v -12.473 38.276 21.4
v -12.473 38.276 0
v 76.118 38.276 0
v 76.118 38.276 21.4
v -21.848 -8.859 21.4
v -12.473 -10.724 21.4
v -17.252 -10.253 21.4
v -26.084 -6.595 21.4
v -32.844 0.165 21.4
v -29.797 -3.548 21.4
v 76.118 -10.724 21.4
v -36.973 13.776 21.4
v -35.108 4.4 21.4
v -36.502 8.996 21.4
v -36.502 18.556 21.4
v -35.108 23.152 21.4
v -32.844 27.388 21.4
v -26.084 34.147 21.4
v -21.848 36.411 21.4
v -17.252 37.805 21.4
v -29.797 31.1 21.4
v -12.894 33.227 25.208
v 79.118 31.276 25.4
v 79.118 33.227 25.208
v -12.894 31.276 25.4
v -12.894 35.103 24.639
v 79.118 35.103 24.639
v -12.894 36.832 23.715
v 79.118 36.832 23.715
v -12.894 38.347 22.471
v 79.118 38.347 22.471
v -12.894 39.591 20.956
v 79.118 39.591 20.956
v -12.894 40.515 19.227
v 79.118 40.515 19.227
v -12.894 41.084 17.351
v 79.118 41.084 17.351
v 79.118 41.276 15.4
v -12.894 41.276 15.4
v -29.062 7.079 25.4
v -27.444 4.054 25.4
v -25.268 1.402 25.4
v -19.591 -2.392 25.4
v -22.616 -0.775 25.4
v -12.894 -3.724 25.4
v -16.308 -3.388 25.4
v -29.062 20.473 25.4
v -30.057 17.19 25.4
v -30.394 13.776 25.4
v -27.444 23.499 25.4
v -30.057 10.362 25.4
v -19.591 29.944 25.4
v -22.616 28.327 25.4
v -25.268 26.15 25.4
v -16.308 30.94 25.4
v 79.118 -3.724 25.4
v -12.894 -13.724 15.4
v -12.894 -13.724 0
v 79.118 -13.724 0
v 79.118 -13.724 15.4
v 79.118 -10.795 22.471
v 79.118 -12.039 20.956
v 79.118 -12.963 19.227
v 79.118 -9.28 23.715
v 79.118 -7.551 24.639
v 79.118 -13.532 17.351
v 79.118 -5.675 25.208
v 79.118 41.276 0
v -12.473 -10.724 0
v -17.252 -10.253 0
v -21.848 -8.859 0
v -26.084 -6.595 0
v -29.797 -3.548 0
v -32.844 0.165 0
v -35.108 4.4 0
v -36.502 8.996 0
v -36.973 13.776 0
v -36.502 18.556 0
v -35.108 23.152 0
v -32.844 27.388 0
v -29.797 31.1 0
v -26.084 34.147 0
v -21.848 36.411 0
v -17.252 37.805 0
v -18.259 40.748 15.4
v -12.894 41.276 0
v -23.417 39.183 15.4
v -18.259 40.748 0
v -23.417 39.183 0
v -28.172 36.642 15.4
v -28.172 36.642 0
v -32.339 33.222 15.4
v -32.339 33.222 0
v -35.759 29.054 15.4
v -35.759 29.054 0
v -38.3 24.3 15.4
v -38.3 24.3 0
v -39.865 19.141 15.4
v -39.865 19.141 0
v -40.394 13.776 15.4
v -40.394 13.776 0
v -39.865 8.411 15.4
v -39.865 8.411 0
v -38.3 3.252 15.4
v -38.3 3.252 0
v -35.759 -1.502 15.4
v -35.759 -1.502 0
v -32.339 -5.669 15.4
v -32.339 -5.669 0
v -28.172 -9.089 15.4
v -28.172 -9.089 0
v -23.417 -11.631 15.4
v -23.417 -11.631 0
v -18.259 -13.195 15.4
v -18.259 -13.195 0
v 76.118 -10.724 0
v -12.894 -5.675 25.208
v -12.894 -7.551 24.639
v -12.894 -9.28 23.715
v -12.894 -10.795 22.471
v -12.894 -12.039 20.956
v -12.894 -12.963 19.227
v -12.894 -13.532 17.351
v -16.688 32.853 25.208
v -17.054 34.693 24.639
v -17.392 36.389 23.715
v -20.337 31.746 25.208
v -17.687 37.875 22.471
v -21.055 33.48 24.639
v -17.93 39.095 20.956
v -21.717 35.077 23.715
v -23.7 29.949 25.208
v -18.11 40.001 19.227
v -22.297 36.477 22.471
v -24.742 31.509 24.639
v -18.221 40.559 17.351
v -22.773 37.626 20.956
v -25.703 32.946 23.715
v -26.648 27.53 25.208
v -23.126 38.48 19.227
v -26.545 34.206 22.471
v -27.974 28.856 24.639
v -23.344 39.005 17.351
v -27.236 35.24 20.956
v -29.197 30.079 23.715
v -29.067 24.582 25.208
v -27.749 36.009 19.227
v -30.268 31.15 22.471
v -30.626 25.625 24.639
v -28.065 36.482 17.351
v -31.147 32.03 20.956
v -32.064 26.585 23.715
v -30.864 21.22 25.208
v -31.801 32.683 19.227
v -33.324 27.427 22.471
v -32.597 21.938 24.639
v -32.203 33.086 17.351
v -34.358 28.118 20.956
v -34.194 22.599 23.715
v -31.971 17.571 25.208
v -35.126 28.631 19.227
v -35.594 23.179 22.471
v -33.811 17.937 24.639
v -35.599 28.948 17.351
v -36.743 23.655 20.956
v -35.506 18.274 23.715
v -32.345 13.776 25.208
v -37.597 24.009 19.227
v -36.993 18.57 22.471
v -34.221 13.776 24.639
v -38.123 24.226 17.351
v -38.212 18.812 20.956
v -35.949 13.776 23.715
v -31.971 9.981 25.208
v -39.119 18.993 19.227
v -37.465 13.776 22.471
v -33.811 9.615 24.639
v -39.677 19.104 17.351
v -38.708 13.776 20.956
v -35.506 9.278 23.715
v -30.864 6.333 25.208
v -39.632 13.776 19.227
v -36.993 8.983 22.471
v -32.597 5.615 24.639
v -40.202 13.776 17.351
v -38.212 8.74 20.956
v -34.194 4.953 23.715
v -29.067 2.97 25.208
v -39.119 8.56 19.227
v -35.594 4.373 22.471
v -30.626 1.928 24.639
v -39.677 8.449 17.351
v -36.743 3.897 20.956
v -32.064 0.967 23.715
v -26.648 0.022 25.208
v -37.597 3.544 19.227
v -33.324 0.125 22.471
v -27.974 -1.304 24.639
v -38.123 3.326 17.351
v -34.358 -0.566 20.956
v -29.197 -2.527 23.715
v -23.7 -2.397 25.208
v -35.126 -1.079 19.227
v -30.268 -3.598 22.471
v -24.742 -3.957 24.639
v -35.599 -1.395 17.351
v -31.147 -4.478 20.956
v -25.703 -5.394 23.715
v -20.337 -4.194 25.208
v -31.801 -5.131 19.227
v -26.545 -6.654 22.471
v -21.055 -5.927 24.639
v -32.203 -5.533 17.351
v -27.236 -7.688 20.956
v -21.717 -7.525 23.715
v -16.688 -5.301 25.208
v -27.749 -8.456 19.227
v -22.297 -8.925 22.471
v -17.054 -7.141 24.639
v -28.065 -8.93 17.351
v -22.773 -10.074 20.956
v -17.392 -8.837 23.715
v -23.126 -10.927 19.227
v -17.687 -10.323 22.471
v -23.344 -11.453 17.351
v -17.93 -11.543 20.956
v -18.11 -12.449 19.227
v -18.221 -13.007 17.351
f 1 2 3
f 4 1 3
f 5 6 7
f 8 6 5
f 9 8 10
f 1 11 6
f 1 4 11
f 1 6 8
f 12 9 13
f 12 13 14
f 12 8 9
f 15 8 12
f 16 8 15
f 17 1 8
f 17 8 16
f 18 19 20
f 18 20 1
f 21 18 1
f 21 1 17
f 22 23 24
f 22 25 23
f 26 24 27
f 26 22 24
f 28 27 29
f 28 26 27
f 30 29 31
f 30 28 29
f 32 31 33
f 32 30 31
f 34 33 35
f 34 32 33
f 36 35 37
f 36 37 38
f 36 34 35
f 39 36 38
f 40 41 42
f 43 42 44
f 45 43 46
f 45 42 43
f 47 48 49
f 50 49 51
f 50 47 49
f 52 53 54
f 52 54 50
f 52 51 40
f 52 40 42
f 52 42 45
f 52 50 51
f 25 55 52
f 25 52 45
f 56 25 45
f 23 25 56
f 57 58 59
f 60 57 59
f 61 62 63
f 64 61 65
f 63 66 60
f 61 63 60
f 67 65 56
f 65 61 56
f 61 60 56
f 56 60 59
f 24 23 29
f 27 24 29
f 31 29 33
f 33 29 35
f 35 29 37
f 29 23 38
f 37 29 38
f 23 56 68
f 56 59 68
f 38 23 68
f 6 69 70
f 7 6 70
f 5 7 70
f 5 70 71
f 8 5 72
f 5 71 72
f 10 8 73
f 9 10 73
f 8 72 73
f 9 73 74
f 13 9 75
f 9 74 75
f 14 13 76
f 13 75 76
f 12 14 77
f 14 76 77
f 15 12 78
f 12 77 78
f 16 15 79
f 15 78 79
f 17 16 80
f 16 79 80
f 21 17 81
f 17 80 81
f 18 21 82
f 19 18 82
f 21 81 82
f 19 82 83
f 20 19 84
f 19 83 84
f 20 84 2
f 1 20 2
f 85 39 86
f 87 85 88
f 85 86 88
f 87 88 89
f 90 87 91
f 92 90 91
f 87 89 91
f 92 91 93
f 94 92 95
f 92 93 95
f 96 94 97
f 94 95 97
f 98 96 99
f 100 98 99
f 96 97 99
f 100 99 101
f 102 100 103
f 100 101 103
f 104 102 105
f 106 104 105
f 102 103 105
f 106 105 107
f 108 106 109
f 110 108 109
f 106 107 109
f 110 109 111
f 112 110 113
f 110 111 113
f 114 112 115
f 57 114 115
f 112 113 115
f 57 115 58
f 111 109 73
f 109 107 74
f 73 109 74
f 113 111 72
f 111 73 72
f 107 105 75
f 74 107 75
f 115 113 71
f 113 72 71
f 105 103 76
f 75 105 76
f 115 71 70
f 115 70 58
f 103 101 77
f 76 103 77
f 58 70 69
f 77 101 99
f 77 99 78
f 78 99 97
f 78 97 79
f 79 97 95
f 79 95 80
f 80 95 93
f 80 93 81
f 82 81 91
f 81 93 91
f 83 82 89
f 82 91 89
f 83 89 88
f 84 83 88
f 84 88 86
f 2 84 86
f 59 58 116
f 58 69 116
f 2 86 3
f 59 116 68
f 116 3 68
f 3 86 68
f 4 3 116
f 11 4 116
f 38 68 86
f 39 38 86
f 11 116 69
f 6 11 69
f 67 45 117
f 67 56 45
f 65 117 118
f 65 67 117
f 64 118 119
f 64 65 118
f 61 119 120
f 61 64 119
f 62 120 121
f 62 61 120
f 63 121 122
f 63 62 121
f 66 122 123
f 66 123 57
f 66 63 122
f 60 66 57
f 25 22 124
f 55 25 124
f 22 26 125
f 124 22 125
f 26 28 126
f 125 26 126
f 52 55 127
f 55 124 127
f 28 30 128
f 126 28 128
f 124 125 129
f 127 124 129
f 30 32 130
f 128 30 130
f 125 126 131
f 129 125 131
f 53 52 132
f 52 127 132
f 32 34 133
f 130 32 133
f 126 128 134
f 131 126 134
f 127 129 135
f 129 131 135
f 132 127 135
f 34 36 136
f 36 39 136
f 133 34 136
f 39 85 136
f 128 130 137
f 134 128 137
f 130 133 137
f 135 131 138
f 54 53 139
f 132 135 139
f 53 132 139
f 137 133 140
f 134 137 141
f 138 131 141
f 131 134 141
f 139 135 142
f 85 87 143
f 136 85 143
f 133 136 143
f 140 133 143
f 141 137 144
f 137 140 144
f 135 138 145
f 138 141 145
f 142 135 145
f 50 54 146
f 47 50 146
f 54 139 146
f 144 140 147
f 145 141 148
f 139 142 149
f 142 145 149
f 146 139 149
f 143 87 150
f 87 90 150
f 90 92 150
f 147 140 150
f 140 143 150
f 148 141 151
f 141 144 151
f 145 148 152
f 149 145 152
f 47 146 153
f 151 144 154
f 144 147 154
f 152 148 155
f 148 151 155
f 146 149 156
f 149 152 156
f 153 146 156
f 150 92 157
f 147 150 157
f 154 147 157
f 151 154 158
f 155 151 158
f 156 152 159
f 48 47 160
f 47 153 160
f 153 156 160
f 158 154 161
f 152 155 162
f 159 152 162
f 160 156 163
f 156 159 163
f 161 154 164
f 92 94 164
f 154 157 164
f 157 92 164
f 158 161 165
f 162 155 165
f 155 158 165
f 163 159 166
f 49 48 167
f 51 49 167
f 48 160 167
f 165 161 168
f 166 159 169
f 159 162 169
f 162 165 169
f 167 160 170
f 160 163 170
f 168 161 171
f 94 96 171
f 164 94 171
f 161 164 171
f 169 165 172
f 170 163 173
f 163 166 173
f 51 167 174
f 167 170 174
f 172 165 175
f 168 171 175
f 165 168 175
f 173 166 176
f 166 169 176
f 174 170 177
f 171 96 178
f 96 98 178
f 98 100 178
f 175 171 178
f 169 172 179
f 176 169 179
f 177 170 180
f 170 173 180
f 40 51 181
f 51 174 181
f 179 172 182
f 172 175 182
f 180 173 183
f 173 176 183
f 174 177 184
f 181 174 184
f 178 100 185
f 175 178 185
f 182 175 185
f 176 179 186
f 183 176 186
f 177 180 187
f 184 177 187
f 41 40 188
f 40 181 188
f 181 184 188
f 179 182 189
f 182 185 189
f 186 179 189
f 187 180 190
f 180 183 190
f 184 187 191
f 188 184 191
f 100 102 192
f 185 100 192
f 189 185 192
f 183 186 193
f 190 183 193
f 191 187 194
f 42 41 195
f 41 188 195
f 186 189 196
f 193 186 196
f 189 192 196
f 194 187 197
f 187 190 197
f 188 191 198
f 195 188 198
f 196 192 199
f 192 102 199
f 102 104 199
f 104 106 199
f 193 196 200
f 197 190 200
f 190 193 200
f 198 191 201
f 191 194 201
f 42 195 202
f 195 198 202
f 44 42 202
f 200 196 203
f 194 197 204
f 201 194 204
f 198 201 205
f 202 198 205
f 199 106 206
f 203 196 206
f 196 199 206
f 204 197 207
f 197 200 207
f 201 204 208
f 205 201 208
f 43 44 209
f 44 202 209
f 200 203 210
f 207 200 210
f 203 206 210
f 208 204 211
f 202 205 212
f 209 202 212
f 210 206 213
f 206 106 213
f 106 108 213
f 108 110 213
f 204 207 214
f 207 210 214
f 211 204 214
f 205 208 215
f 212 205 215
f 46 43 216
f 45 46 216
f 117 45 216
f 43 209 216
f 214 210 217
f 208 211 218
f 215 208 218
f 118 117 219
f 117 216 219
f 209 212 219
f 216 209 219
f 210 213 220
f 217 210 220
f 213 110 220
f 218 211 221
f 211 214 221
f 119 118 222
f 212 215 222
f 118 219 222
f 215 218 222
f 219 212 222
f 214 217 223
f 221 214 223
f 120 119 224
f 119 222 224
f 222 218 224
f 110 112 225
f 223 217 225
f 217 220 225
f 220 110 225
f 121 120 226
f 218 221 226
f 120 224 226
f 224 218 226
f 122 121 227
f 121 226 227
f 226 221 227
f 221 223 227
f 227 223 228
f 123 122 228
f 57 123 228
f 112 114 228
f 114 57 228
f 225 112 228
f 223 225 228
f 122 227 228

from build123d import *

# Parameters (mm, degrees)
BOSS_EXTRUDE3_DEPTH = 25.4
BOSS_EXTRUDE4_DEPTH = 4
FILLET2_R           = 10


with BuildPart() as part:
    # Sketch4 → Boss-Extrude3 (new body)
    with BuildSketch(Plane.XY):
        with BuildLine():
            Line((79.118213734, 41.276110426), (-12.893671351, 41.276110426))
            ThreePointArc((-12.893671351, 41.276110426), (-40.393671351, 13.776110426), (-12.893671351, -13.723889574))
            Line((-12.893671351, -13.723889574), (79.118213734, -13.723889574))
            Line((79.118213734, -13.723889574), (79.118213734, 41.276110426))
        make_face()
        with BuildLine():
            Line((-12.472737934, 38.276110426), (76.118213734, 38.276110426))
            Line((76.118213734, 38.276110426), (76.118213734, -10.723889574))
            Line((76.118213734, -10.723889574), (-12.472737934, -10.723889574))
            ThreePointArc((-12.472737934, -10.723889574), (-36.972737934, 13.776110426), (-12.472737934, 38.276110426))
        make_face(mode=Mode.SUBTRACT)
    extrude(amount=BOSS_EXTRUDE3_DEPTH)

    # Sketch6 → Boss-Extrude4 (add)
    with BuildSketch(Plane.XY.offset(25.4)):
        with BuildLine():
            Line((-12.893671351, 41.276110426), (79.118213734, 41.276110426))
            Line((79.118213734, 41.276110426), (79.118213734, -13.723889574))
            Line((79.118213734, -13.723889574), (-12.893671351, -13.723889574))
            ThreePointArc((-12.893671351, -13.723889574), (-40.393671351, 13.776110426), (-12.893671351, 41.276110426))
        make_face()
    extrude(amount=-BOSS_EXTRUDE4_DEPTH)

    # Fillet2
    fillet2_edges = [part.edges().sort_by_distance(p)[0] for p in [
        (-40.393671351, 13.776110426, 25.4),
        (33.112271192, -13.723889574, 25.4),
        (33.112271192, 41.276110426, 25.4),
    ]]
    fillet(fillet2_edges, radius=FILLET2_R)


solid = part.part
